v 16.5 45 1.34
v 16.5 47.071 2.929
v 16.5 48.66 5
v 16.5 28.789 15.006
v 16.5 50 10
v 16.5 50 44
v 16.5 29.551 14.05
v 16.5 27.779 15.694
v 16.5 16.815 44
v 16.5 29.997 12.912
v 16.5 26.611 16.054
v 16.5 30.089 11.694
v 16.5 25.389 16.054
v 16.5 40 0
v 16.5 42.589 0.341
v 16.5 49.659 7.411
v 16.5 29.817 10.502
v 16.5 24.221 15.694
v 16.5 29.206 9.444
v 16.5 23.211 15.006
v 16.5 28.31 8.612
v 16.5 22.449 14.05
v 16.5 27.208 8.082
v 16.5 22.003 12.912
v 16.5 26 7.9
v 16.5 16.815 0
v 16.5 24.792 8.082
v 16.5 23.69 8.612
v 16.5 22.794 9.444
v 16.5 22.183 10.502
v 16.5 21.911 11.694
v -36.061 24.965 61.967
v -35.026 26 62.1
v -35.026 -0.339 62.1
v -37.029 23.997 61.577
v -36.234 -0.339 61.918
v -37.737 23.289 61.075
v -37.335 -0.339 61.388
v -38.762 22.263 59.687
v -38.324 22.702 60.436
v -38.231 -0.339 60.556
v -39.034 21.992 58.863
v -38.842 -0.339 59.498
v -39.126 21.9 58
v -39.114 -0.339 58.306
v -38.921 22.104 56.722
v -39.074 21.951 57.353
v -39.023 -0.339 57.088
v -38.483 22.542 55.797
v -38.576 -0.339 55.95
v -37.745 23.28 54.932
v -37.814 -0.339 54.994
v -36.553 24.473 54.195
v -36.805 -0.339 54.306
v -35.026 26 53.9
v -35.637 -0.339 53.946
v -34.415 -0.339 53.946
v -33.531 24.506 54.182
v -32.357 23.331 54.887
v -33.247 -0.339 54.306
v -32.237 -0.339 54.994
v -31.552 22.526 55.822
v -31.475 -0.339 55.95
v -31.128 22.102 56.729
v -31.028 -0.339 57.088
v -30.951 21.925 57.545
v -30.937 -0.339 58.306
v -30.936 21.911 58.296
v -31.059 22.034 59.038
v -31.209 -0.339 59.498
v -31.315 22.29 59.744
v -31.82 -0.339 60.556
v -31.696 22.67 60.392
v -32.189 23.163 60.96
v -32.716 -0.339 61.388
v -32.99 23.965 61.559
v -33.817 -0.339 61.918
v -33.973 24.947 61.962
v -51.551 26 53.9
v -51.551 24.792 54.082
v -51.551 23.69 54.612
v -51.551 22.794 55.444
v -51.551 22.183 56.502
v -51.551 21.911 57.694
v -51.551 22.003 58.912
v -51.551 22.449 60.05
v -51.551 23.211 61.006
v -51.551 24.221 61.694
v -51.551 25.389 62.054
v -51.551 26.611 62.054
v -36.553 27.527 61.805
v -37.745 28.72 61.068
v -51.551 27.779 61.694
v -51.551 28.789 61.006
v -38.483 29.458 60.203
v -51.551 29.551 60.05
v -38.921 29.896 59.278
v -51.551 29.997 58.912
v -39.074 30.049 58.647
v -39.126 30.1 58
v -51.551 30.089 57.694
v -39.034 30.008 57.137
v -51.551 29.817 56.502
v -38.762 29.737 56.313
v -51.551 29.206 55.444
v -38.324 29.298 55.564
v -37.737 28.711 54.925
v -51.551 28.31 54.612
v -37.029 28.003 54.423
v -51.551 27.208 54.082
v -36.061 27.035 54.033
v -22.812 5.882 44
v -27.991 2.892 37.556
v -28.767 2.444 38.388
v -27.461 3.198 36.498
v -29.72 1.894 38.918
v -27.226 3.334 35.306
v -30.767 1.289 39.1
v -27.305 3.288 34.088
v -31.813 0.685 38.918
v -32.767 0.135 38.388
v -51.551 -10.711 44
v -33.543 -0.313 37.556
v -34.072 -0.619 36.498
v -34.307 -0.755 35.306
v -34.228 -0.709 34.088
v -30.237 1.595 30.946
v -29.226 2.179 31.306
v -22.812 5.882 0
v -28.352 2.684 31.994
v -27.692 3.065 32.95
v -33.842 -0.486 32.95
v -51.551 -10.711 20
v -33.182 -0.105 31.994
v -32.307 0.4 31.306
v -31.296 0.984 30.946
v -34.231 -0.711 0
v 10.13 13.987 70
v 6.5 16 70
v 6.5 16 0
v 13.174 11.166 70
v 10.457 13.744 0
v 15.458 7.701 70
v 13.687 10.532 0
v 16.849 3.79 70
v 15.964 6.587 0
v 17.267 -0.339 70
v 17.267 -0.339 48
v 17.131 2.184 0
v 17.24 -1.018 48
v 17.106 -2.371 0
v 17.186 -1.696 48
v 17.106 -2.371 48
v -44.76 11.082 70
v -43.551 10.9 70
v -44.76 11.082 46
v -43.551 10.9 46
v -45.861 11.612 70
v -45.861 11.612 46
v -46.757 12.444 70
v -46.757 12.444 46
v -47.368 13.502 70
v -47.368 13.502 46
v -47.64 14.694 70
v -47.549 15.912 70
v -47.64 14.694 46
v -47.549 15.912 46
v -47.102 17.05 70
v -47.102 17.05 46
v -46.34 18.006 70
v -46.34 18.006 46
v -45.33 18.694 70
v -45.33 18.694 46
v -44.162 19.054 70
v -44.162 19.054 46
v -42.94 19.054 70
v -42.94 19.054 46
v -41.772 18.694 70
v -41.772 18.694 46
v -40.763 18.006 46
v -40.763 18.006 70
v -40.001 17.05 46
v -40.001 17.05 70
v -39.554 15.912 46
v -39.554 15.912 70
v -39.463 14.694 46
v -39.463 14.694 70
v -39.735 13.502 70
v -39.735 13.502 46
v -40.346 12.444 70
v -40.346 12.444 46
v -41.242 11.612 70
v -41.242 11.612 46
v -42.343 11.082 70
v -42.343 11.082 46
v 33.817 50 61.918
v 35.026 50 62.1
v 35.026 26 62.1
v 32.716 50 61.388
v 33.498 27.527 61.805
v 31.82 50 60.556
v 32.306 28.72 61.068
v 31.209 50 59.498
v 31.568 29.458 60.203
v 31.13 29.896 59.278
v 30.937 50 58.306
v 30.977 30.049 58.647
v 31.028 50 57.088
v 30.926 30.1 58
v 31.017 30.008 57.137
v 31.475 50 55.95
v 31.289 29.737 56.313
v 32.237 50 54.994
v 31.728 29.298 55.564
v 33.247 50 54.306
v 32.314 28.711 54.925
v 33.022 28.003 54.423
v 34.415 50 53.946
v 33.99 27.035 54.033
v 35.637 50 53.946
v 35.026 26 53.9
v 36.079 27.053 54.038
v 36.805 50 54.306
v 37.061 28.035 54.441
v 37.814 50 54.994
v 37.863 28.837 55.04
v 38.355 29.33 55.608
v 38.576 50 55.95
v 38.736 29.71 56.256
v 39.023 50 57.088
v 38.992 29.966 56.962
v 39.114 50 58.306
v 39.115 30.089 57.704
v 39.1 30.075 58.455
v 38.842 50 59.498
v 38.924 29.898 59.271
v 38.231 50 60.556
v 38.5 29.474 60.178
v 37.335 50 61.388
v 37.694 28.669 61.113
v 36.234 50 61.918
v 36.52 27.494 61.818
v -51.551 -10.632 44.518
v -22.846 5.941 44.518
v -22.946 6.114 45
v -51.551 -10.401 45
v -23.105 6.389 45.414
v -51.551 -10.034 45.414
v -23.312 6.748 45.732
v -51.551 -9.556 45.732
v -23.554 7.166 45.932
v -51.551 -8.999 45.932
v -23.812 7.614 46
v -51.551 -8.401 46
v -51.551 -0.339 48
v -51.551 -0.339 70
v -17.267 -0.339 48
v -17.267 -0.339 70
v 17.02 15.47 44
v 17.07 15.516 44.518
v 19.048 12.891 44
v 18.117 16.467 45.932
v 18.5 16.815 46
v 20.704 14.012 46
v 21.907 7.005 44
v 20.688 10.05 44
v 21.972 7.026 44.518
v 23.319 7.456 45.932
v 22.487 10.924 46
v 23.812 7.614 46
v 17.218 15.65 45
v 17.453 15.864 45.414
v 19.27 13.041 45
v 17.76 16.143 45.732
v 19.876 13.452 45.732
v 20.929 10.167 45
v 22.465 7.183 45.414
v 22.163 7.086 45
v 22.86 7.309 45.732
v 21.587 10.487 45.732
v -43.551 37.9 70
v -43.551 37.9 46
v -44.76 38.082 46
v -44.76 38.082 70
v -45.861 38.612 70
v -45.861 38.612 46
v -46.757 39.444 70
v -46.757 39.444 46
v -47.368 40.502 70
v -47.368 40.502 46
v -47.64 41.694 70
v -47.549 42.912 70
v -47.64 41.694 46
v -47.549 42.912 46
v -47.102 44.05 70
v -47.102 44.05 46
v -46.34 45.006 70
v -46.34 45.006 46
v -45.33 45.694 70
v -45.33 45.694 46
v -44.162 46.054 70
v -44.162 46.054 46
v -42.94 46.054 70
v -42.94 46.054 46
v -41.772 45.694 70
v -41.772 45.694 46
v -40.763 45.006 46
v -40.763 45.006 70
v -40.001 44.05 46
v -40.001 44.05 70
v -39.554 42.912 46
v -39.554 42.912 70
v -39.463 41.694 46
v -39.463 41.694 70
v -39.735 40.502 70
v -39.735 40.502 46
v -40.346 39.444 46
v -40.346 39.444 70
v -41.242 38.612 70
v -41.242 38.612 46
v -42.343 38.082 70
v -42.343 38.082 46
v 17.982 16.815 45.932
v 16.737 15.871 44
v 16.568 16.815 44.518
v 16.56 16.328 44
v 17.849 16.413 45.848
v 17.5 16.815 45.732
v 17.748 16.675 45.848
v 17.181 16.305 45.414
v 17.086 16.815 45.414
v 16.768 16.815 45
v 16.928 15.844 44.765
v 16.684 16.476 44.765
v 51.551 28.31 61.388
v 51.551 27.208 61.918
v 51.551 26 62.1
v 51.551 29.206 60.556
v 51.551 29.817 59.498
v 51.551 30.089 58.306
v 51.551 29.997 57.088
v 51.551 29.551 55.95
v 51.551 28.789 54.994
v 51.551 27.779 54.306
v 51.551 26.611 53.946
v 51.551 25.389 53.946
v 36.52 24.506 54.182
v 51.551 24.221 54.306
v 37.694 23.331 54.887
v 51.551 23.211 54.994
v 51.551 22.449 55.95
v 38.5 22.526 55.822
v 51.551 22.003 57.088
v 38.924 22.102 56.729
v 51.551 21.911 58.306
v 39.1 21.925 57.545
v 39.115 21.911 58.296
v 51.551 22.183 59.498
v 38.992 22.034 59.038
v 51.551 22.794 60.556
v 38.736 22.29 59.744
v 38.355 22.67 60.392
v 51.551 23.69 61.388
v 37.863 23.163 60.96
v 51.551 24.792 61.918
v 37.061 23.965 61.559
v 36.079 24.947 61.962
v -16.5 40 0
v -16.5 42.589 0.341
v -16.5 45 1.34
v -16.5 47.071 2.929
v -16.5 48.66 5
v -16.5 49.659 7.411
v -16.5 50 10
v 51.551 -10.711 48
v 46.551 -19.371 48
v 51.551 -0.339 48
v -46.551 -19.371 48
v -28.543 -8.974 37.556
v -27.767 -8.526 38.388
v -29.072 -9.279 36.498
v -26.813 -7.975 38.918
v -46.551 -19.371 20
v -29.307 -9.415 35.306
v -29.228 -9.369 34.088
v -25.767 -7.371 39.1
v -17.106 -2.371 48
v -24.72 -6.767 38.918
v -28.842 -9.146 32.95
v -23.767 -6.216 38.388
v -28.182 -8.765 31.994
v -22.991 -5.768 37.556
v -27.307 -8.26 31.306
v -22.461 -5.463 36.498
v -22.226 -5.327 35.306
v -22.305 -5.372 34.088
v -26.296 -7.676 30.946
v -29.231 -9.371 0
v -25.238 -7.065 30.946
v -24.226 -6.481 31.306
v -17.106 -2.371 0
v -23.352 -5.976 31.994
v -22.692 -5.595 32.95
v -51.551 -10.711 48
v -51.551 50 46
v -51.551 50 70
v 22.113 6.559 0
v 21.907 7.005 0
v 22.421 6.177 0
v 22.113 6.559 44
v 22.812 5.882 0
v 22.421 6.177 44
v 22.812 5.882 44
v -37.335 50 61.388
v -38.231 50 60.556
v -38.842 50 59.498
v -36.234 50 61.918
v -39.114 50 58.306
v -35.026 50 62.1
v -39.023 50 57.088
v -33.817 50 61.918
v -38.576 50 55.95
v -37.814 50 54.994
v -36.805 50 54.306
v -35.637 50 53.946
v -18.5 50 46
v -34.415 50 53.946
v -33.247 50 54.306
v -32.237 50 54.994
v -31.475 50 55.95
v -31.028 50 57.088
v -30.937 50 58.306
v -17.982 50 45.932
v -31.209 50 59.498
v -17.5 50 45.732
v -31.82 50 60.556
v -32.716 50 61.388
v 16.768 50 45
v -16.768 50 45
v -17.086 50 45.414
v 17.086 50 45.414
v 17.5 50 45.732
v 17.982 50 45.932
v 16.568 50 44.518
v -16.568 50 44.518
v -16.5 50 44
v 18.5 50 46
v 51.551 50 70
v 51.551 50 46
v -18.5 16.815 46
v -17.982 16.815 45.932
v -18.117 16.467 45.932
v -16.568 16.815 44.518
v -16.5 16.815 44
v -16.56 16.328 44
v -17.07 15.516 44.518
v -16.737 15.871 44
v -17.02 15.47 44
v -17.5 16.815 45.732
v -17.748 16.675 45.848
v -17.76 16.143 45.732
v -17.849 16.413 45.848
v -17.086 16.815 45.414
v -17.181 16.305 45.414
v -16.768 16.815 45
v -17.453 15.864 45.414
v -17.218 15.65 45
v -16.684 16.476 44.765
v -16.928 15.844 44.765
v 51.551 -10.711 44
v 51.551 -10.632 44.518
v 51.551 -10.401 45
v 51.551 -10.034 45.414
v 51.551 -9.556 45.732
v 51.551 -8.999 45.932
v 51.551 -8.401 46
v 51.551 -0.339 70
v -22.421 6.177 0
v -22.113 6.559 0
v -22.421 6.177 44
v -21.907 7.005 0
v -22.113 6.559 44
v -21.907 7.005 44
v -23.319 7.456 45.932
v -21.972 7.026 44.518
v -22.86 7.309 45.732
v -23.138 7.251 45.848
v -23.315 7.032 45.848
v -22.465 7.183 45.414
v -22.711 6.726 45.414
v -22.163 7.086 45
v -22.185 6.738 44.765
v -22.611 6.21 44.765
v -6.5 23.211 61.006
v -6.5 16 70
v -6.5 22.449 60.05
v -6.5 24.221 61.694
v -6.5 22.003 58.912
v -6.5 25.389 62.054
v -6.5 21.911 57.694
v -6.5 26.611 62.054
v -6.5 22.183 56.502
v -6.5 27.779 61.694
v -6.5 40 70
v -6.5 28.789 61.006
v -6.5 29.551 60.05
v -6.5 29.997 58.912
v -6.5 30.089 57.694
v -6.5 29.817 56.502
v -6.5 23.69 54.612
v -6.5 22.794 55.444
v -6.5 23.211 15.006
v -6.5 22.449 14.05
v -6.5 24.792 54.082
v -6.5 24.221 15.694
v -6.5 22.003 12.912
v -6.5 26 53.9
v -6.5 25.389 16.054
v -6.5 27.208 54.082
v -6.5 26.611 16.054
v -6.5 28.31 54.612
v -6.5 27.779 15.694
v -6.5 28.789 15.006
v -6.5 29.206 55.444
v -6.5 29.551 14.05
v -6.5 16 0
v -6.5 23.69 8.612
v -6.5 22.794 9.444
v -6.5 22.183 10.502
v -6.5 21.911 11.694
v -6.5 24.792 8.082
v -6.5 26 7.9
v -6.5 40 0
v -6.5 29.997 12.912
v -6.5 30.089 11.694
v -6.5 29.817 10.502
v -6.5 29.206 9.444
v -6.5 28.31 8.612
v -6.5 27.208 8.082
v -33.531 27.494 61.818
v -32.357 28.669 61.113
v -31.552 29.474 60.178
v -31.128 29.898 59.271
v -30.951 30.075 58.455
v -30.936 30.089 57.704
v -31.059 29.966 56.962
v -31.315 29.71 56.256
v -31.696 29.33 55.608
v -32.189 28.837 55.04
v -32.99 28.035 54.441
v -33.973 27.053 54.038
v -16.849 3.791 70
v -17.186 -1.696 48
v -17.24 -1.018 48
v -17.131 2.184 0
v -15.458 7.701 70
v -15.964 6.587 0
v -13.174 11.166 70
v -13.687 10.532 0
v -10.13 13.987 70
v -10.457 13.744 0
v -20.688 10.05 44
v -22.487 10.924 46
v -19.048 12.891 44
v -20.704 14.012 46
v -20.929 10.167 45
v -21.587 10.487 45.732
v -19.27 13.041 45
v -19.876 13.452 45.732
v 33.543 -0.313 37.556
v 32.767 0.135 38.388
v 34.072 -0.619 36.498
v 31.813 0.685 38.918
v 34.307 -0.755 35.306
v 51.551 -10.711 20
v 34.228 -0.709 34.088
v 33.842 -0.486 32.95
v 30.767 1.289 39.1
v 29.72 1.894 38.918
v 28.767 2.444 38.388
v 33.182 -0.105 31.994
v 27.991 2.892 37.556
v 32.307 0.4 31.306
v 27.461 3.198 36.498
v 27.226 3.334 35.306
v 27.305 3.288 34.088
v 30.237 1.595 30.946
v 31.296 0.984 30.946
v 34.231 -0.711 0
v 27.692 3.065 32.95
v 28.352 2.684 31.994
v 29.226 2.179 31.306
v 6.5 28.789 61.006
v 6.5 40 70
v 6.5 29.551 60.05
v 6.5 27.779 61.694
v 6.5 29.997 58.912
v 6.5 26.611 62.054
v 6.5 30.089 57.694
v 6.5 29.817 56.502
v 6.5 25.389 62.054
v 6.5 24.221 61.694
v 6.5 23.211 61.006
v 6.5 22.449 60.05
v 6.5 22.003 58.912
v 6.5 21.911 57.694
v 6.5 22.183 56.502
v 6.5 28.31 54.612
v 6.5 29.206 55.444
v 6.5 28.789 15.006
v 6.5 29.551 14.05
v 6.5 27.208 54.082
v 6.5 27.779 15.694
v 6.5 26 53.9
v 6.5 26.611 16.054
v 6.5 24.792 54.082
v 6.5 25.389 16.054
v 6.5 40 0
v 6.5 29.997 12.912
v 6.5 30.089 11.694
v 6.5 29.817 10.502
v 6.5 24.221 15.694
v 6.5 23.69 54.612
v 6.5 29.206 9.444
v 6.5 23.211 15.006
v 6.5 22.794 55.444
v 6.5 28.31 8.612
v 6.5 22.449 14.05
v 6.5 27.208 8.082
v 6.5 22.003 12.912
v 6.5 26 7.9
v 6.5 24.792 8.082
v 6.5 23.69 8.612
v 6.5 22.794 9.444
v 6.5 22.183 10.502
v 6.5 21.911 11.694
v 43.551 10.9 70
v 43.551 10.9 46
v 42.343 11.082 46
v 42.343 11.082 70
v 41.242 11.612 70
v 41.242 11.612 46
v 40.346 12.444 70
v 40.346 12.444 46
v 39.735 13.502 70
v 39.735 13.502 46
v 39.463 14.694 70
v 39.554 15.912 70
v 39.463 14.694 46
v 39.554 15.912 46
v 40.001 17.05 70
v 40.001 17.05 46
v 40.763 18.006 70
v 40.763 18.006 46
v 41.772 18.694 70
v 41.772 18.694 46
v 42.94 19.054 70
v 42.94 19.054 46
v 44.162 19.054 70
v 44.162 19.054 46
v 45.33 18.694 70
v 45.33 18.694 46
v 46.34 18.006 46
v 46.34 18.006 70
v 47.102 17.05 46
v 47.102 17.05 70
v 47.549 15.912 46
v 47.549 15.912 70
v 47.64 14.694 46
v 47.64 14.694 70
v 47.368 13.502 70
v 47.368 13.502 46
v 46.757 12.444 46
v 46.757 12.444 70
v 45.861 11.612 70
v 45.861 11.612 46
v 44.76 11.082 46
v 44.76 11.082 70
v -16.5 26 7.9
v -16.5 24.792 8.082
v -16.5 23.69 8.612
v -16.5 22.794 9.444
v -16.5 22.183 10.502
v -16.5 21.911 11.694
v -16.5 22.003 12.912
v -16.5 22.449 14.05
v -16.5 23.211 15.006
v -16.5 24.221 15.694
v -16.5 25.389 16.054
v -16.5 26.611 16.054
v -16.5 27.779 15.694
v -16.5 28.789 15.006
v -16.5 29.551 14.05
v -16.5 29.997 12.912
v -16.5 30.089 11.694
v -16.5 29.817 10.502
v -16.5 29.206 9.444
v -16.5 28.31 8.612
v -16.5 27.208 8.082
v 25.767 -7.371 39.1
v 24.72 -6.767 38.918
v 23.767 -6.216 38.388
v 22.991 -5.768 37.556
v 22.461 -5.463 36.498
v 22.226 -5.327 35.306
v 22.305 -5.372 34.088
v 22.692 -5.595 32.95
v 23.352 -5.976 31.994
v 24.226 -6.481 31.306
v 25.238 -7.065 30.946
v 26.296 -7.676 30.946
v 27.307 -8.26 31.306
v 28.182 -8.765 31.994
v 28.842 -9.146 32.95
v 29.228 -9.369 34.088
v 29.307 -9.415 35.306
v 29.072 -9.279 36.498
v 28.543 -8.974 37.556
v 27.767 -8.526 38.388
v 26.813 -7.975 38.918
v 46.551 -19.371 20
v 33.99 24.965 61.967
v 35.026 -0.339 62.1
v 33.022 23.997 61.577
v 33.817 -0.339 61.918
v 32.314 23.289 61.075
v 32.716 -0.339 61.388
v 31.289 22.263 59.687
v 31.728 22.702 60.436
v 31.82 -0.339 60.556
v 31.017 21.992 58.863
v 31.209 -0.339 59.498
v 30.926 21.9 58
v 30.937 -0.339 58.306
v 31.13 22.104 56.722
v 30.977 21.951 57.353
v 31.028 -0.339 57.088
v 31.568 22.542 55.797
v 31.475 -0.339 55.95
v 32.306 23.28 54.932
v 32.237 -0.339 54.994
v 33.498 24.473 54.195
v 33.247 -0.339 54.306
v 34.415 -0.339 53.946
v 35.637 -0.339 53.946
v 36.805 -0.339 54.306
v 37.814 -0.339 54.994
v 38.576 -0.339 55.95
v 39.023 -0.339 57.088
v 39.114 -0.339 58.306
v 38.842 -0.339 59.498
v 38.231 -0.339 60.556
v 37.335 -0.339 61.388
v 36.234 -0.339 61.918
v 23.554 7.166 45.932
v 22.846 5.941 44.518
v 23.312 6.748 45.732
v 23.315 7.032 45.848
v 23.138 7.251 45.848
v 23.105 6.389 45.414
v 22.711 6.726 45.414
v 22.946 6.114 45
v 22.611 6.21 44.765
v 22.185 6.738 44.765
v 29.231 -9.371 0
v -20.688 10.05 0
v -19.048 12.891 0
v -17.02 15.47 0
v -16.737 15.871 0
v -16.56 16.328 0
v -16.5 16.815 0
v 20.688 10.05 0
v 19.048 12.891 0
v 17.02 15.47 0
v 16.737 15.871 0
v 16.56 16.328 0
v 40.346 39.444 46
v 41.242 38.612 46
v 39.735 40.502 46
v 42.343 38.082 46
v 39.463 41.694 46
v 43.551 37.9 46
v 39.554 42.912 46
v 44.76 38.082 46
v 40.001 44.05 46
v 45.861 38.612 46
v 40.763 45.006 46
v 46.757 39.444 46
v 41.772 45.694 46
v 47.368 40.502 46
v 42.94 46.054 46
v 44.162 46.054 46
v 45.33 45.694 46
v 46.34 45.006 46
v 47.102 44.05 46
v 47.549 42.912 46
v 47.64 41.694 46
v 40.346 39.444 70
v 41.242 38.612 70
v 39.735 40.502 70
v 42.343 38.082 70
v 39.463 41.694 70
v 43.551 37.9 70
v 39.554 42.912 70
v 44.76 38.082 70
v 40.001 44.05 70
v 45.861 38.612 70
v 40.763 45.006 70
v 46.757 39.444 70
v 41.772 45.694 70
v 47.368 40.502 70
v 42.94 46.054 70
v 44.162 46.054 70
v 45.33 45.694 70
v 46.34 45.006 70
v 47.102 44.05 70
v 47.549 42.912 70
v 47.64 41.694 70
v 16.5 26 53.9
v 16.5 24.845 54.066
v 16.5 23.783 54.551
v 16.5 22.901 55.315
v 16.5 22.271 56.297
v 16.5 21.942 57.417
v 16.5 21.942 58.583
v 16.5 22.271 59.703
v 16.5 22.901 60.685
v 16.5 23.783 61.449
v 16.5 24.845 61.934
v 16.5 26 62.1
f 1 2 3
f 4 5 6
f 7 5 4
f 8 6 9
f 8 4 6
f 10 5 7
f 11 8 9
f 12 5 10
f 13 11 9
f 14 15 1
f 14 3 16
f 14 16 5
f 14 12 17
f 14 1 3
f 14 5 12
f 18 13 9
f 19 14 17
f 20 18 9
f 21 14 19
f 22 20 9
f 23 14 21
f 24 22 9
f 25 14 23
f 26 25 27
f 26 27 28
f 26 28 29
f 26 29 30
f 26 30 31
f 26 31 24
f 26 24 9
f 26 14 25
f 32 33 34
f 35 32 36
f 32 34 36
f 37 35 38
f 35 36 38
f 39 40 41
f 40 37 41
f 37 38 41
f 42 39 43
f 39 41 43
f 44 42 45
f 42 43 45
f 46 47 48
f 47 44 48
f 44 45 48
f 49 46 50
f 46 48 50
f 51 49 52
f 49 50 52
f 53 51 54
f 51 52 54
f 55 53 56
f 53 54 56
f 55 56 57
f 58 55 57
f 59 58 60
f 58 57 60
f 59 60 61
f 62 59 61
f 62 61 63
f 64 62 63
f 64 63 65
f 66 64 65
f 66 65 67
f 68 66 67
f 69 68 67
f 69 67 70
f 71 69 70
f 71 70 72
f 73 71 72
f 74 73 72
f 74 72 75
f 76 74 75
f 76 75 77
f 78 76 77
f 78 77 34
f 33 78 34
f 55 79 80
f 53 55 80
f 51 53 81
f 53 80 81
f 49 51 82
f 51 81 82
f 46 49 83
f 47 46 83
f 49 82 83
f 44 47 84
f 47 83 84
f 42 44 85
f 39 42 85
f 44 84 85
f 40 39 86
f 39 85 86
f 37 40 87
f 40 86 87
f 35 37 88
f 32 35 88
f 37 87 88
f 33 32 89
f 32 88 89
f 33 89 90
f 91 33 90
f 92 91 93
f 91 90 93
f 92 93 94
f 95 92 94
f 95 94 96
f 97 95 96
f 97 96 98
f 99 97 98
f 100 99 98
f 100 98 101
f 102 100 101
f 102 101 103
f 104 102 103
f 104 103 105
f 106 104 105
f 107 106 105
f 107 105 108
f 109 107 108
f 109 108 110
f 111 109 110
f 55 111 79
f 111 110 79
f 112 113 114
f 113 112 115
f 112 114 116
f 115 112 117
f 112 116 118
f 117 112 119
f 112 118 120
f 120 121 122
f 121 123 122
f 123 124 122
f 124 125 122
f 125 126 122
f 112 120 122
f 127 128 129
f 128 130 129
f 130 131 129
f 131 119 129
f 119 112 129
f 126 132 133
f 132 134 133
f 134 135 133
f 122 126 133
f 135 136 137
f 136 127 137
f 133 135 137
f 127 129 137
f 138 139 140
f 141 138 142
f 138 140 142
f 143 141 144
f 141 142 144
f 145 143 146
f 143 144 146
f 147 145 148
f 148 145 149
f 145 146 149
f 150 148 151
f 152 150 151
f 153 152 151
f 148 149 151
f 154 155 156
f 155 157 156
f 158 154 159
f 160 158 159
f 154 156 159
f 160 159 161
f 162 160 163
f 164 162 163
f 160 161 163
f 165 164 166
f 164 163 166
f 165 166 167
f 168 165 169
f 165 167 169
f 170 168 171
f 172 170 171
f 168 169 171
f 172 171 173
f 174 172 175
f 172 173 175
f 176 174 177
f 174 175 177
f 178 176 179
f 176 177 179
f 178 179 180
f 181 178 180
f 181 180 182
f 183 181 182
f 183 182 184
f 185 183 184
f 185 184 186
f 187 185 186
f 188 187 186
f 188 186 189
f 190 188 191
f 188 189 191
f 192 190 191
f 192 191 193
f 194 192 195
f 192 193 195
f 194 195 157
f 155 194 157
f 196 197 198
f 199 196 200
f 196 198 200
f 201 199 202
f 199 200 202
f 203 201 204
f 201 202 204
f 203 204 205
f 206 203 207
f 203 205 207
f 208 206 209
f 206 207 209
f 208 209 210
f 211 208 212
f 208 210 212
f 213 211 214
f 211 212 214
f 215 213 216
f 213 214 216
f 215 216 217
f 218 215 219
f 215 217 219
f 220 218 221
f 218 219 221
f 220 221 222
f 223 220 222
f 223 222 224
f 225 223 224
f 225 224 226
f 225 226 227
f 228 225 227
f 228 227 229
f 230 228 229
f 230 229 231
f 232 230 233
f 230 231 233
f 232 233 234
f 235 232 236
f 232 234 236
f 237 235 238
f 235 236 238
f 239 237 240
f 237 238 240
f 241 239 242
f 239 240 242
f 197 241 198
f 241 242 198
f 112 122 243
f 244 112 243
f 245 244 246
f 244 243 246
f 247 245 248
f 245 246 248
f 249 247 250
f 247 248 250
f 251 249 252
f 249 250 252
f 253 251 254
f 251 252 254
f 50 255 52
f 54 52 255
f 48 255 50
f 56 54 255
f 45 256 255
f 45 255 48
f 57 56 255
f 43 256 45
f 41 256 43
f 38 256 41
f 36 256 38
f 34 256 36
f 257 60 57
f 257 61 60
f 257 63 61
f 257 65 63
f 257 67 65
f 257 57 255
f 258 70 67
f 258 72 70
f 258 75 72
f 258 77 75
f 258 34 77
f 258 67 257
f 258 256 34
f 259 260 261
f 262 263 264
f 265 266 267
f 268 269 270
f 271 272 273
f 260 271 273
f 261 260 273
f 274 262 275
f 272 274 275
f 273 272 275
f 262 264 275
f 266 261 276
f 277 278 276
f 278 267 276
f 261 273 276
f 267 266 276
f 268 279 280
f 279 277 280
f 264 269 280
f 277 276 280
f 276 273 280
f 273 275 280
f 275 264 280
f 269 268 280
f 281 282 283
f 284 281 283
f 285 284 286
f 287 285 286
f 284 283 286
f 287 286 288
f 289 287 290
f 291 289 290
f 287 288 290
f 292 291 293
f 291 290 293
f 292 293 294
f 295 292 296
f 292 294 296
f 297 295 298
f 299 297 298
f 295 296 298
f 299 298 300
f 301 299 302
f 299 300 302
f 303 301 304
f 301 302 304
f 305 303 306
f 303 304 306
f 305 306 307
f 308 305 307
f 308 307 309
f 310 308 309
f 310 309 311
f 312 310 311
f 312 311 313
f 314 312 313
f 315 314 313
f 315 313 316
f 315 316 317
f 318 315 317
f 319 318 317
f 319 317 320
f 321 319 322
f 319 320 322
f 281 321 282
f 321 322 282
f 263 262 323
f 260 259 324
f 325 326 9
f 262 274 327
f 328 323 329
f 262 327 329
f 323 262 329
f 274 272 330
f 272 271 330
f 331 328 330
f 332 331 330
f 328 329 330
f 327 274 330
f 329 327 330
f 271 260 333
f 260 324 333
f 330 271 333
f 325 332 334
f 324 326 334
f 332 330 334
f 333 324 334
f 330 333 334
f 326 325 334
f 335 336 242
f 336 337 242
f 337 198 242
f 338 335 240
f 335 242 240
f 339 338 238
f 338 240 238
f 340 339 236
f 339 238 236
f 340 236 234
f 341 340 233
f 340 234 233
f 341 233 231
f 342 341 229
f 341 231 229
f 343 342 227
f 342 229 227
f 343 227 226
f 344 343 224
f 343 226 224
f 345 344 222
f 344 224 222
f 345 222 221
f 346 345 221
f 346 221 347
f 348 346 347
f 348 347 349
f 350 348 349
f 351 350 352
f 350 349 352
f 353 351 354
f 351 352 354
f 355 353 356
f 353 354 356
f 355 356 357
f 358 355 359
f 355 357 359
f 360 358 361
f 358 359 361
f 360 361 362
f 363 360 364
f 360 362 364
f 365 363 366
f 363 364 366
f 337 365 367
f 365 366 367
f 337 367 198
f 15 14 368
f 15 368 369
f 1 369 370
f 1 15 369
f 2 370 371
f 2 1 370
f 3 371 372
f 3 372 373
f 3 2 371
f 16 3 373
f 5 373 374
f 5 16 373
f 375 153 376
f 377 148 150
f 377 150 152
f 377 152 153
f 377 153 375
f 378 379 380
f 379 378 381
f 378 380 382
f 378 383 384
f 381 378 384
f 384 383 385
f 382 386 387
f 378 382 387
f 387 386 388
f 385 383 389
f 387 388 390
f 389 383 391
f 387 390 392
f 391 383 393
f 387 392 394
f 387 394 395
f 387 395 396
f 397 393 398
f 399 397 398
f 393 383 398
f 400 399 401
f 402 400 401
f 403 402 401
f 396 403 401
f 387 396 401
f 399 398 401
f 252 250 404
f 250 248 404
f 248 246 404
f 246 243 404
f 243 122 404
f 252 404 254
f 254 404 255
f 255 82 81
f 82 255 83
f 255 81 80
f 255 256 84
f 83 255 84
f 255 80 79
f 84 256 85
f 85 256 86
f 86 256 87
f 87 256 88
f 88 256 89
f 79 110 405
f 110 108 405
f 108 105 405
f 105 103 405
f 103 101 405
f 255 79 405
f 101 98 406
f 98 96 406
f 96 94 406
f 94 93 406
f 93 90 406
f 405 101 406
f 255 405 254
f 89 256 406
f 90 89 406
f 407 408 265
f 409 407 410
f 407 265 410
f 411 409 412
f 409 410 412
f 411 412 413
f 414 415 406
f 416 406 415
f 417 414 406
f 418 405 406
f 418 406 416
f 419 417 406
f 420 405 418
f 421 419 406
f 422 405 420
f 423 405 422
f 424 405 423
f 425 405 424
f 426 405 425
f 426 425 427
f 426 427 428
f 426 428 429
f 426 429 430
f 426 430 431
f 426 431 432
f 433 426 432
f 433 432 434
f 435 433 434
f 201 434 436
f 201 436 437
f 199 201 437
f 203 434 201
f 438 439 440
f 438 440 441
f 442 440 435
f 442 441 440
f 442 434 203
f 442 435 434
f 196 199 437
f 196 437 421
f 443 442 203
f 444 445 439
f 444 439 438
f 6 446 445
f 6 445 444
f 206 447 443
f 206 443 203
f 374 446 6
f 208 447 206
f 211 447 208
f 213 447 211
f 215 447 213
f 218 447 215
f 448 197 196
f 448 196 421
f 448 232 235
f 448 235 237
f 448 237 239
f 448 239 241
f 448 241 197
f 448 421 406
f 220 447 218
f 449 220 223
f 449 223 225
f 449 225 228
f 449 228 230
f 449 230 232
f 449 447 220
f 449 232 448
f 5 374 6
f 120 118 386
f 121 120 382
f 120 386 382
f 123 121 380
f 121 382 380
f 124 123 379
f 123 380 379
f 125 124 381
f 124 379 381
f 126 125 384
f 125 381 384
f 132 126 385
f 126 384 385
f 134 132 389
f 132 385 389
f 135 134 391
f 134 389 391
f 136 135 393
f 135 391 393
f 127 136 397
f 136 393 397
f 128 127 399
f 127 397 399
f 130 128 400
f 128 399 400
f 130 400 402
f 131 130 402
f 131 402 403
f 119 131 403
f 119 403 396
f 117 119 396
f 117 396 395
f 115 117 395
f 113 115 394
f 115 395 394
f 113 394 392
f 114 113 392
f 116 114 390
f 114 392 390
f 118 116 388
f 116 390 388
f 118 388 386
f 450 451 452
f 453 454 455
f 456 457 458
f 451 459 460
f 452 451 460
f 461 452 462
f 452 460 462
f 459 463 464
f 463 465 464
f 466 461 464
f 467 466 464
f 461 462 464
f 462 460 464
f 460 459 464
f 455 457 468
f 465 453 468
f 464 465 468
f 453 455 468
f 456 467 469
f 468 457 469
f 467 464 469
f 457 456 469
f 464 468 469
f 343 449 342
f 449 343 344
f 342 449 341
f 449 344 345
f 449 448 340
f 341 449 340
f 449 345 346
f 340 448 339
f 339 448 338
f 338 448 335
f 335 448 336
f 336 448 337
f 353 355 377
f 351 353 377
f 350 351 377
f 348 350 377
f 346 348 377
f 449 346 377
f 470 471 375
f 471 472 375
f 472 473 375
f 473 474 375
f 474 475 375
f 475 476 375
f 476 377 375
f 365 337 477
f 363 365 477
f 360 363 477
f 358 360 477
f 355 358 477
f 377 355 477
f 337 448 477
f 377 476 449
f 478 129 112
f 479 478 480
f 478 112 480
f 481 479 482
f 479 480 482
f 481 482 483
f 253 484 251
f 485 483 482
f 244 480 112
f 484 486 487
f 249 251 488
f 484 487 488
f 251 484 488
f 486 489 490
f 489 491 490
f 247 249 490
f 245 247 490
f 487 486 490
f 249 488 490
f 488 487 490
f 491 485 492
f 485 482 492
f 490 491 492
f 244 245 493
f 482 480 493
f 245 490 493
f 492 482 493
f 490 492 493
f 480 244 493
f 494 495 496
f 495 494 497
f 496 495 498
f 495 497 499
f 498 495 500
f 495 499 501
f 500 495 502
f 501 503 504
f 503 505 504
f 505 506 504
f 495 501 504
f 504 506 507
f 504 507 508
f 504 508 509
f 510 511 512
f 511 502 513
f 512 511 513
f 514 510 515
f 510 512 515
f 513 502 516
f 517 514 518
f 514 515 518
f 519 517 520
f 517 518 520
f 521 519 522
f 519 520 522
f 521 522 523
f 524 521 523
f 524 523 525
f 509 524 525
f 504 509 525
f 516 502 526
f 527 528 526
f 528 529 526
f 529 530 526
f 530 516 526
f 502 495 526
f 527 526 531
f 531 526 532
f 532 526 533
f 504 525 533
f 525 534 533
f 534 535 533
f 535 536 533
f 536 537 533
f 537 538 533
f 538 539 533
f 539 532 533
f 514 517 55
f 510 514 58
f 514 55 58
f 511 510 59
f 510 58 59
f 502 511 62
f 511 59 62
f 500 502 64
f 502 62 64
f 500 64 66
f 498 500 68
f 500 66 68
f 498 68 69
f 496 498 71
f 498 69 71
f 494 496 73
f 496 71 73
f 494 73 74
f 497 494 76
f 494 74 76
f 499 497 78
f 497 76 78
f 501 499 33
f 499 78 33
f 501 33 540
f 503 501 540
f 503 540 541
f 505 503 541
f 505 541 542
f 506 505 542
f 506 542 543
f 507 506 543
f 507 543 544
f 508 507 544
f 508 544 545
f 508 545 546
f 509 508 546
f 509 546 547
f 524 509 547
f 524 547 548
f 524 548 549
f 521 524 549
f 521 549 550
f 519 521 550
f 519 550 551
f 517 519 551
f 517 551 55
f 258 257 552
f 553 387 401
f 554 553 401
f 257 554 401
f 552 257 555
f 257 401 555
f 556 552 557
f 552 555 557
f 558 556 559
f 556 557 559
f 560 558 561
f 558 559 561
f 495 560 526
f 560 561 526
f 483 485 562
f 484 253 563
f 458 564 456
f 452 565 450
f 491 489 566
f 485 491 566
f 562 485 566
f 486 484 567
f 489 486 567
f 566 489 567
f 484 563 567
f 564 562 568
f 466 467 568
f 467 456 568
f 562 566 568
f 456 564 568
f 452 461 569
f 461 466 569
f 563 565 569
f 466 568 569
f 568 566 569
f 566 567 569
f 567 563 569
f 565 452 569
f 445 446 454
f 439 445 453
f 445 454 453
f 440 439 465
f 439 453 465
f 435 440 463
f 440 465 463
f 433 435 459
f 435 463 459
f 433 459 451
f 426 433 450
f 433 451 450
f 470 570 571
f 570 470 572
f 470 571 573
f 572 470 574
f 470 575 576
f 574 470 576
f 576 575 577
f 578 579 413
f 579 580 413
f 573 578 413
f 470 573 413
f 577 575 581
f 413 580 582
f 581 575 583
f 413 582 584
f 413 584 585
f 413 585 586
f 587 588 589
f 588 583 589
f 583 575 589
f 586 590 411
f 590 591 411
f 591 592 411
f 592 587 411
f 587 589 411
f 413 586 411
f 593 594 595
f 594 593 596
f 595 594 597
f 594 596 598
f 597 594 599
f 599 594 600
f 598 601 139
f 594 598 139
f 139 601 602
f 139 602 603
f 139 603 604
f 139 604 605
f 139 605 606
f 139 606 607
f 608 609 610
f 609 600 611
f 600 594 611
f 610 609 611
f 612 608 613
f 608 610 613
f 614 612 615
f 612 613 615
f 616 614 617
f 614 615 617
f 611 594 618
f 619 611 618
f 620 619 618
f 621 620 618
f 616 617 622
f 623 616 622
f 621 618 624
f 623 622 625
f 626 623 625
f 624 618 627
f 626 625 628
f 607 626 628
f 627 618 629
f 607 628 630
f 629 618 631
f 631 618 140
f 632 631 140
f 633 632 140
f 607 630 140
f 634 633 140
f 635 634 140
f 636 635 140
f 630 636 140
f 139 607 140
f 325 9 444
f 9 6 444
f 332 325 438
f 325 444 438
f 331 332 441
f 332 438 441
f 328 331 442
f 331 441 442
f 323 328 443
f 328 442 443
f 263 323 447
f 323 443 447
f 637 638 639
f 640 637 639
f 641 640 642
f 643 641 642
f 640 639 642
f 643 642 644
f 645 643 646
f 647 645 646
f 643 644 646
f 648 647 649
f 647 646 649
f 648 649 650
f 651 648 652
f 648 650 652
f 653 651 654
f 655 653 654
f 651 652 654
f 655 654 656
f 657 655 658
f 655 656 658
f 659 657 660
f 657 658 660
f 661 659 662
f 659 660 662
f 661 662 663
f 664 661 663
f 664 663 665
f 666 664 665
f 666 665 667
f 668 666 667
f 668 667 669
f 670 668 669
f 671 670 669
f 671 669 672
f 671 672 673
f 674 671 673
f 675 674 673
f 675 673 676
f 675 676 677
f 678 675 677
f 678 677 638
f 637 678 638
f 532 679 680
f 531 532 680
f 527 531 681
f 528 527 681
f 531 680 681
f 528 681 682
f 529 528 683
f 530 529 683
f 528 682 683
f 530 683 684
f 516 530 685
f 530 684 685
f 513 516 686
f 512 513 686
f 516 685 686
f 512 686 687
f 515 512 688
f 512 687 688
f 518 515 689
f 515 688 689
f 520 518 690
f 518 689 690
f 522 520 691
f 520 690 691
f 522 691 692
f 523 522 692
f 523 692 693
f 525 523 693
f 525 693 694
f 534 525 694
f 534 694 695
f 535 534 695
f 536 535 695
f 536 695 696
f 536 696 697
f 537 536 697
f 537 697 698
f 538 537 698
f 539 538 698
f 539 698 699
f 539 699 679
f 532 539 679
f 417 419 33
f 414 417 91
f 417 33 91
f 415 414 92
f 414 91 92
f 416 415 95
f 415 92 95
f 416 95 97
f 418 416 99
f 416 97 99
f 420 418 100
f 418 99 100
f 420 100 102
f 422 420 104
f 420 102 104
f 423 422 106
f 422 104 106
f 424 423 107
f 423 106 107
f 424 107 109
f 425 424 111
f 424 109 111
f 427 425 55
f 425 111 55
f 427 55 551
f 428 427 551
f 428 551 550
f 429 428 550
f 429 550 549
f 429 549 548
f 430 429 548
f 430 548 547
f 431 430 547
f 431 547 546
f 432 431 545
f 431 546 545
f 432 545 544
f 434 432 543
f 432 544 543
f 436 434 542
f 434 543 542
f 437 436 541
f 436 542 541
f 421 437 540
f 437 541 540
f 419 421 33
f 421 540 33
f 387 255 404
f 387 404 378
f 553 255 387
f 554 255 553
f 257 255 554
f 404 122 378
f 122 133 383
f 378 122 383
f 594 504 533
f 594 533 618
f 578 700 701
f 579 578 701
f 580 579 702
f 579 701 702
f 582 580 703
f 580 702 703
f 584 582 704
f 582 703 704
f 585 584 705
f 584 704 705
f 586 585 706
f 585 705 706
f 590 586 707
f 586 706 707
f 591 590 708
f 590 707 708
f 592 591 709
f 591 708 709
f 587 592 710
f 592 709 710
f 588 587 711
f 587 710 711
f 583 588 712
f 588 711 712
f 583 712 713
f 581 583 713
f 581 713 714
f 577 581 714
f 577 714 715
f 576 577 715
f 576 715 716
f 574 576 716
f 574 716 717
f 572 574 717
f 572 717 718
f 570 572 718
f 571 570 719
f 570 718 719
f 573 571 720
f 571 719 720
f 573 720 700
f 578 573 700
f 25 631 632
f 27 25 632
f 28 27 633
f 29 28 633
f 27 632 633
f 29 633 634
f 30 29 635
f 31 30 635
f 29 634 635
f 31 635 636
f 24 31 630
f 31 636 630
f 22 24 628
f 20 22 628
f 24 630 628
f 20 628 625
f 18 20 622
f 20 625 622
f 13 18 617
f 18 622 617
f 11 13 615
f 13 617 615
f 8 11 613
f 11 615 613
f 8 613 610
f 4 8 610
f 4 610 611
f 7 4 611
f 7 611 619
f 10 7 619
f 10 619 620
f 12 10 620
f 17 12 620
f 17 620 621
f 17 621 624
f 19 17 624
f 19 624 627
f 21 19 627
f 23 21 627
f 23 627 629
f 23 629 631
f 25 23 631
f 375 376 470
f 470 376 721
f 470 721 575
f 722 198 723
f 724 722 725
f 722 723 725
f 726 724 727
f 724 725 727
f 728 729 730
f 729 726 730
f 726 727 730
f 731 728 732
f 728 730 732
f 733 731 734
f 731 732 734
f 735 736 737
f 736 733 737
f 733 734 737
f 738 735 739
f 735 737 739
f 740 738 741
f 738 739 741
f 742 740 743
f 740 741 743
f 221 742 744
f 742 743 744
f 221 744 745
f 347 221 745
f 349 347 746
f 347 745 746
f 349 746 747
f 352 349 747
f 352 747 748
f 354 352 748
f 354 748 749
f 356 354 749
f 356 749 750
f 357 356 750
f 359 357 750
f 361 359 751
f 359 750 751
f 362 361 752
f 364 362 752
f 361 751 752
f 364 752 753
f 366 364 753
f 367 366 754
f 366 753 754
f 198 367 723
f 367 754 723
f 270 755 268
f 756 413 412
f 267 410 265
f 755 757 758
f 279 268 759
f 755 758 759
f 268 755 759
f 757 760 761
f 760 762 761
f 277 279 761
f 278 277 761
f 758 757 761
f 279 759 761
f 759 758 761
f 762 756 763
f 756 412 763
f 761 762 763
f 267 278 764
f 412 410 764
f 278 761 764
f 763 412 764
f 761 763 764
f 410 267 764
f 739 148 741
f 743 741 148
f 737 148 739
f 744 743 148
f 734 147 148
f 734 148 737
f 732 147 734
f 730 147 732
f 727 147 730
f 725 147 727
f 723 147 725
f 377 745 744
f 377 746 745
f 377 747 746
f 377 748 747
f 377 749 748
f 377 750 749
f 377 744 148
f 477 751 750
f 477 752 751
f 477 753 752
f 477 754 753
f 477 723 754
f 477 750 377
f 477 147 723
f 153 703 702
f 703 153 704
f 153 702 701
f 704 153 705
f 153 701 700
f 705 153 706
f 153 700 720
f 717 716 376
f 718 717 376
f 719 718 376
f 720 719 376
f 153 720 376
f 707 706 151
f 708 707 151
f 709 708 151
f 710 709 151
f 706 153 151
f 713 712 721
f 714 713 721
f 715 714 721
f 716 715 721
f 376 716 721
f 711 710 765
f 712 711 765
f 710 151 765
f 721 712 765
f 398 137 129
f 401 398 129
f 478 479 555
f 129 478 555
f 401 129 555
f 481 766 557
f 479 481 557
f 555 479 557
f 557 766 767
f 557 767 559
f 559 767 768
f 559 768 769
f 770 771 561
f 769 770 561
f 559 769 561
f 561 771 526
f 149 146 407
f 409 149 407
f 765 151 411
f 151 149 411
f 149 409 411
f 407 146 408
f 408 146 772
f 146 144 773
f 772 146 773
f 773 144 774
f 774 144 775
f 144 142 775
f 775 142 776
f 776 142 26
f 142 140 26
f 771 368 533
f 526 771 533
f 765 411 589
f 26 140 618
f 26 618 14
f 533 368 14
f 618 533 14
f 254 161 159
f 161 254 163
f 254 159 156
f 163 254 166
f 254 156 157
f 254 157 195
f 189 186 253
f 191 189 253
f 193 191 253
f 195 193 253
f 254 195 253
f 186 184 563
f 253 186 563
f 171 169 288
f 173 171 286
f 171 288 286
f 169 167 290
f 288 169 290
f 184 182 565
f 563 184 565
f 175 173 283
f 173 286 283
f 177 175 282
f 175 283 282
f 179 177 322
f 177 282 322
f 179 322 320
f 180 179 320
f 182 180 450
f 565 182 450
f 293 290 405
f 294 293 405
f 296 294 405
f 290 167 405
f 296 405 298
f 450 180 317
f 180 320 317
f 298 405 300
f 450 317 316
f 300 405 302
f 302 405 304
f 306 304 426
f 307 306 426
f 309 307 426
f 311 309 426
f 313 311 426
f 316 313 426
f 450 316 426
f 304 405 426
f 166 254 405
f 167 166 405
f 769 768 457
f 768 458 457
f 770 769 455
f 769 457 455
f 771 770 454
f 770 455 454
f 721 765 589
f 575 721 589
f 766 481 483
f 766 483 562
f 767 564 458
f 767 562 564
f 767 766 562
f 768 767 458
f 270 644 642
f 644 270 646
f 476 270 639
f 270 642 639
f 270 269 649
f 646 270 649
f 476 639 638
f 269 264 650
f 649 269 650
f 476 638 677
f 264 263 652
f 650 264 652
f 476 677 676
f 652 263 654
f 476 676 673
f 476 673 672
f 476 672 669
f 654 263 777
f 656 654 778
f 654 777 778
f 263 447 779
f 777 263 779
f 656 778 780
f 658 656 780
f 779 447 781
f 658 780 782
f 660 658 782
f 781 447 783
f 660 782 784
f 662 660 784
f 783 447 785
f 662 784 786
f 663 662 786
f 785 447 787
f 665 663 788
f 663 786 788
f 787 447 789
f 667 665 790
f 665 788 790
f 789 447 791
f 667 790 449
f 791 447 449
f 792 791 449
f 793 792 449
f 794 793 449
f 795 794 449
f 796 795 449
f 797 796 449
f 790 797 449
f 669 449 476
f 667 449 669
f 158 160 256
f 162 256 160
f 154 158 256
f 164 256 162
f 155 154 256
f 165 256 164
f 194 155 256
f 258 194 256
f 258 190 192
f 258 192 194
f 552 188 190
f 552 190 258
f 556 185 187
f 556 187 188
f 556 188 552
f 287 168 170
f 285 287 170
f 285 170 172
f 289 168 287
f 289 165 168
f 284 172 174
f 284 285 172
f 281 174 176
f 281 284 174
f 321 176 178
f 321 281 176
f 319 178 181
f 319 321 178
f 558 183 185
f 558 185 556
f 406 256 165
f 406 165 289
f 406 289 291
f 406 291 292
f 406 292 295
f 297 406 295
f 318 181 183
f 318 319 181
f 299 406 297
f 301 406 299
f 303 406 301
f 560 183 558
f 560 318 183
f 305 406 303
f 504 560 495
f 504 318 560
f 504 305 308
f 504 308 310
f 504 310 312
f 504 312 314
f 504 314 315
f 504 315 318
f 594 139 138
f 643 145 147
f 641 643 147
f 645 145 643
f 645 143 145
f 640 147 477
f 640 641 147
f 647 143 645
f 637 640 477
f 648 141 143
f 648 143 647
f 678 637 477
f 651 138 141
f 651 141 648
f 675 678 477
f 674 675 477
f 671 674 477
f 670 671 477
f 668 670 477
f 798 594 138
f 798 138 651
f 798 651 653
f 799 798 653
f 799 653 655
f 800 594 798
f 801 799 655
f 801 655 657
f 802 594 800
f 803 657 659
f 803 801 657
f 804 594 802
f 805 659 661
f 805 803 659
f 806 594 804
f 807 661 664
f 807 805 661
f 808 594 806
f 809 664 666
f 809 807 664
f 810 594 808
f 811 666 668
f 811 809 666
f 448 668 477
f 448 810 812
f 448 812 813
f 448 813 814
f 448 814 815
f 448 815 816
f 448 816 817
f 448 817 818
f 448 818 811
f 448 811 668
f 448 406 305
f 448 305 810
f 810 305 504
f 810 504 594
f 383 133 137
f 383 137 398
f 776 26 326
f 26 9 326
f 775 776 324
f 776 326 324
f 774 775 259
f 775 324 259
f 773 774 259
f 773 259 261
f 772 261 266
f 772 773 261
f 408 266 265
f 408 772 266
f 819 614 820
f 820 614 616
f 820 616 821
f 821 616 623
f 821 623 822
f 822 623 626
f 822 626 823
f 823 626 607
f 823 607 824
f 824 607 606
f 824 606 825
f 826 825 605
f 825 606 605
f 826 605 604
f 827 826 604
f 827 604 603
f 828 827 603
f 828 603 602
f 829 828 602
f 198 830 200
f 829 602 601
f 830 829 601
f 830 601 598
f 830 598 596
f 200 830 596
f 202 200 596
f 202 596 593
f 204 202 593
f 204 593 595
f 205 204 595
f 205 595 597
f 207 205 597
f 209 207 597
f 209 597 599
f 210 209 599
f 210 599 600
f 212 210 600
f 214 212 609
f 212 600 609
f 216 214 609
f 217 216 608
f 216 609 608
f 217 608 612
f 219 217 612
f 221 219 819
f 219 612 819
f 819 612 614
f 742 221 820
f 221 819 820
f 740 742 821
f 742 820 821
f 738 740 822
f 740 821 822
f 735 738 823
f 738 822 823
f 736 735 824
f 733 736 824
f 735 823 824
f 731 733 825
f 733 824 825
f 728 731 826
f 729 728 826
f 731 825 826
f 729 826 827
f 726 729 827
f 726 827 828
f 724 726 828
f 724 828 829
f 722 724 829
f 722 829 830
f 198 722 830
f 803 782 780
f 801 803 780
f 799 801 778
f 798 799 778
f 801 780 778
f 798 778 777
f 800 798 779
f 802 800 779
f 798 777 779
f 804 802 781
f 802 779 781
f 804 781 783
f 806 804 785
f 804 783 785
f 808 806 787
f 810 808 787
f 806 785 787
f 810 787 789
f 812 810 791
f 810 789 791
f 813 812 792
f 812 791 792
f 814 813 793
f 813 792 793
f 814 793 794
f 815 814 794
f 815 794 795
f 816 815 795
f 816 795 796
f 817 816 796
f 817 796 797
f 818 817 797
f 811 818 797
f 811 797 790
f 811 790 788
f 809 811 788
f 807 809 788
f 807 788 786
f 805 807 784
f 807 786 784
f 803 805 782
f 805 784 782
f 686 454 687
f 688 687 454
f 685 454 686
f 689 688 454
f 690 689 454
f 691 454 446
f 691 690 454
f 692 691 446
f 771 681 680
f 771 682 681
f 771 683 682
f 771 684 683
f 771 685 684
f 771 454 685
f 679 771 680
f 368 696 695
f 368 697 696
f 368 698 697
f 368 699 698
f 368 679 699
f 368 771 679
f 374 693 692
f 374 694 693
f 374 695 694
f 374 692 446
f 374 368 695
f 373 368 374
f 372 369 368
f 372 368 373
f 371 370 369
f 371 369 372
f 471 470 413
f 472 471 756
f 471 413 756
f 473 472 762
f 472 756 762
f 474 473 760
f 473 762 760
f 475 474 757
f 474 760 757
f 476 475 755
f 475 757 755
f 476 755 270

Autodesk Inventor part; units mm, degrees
ref_plane "YZ Plane" through (0, 0, 0) normal (1, 0, 0) x (0, 1, 0)
ref_plane "XZ Plane" through (0, 0, 0) normal (0, 1, 0) x (-1, 0, 0)
ref_plane "XY Plane" through (0, 0, 0) normal (0, 0, 1) x (1, 0, 0)
sketch "Sketch1" plane through (0, 0, 0) normal (0, 0, 1) x (1, 0, 0)
  circle A0 centre (0, 0) radius 15 construction
  circle A1 centre (0, 0) radius 26 construction
  line L0 (3.5, 37) -> (-3.5, 37) construction
  line L1 (-3.5, 37) -> (-3.5, 15) construction
  line L2 (-3.5, 15) -> (3.5, 15) construction
  line L3 (3.5, 15) -> (3.5, 37) construction
  line L4 (3.5, 37) -> (-3.5, 15) construction
  line L5 (-3.5, 37) -> (3.5, 15) construction
  line L6 (-6.5, 16) -> (-6.5, 40) construction
  line L7 (-6.5, 40) -> (6.5, 40) construction
  line L8 (6.5, 40) -> (6.5, 16) construction
  circle A2 centre (0, 0) radius 17.2699 construction
  line L9 (-16.5, 16) -> (-16.5, 50) construction
  line L10 (-16.5, 50) -> (16.5, 50) construction
  line L11 (16.5, 50) -> (16.5, 16) construction
  circle A3 centre (0, 0) radius 23 construction
  line L12 (-25, 26) -> (25, 26) construction
  line L13 (-25, 30) -> (25, 30) construction
  line L14 (-25, 22) -> (25, 22) construction
  line L15 (-35.0513, -39.2894) -> (-51.5513, -10.7106) construction
  line L16 (-31.391, -25.6292) -> (-37.891, -14.3708) construction
  line L17 (-5.6064, -22.2894) -> (-35.0513, -39.2894) construction
  line L18 (-51.5513, -10.7106) -> (-22.1064, 6.2894) construction
  line L19 (-37.891, -14.3708) -> (-17.1064, -2.3708) construction
  line L20 (-10.6064, -13.6292) -> (-31.391, -25.6292) construction
  line L21 (-30.2929, -21.5311) -> (-11.2404, -10.5311) construction
  line L22 (-11.2404, -10.5311) -> (-14.7404, -4.4689) construction
  line L23 (-14.7404, -4.4689) -> (-33.7929, -15.4689) construction
  line L24 (-33.7929, -15.4689) -> (-11.2404, -10.5311) construction
  line L25 (-30.2929, -21.5311) -> (-14.7404, -4.4689) construction
  line L26 (-33.7929, -15.4689) -> (-30.2929, -21.5311) construction
  line L27 (-13.4808, -36.6506) -> (-38.4808, 6.6506) construction
  line L28 (-10.0167, -34.6506) -> (-35.0167, 8.6506) construction
  line L29 (-6.5526, -32.6506) -> (-31.5526, 10.6506) construction
  line L30 (51.5513, -10.7106) -> (35.0513, -39.2894) construction
  line L31 (37.891, -14.3708) -> (31.391, -25.6292) construction
  line L32 (22.1064, 6.2894) -> (51.5513, -10.7106) construction
  line L33 (35.0513, -39.2894) -> (5.6064, -22.2894) construction
  line L34 (31.391, -25.6292) -> (10.6064, -13.6292) construction
  line L35 (17.1064, -2.3708) -> (37.891, -14.3708) construction
  line L36 (33.7929, -15.4689) -> (14.7404, -4.4689) construction
  line L37 (14.7404, -4.4689) -> (11.2404, -10.5311) construction
  line L38 (11.2404, -10.5311) -> (30.2929, -21.5311) construction
  line L39 (30.2929, -21.5311) -> (14.7404, -4.4689) construction
  line L40 (33.7929, -15.4689) -> (11.2404, -10.5311) construction
  line L41 (30.2929, -21.5311) -> (33.7929, -15.4689) construction
  line L42 (38.4808, 6.6506) -> (13.4808, -36.6506) construction
  line L43 (35.0167, 8.6506) -> (10.0167, -34.6506) construction
  line L44 (31.5526, 10.6506) -> (6.5526, -32.6506) construction
  line L45 (-16.5, 16.0234) -> (-16.5, 50)
  line L46 (-16.5, 50) -> (16.5, 50)
  line L47 (16.5, 50) -> (16.5, 16.0234)
  line L48 (-6.5, 16) -> (-6.5, 40)
  line L49 (-6.5, 40) -> (6.5, 40)
  line L50 (6.5, 40) -> (6.5, 16)
  line L51 (-22.1267, 6.2777) -> (-51.5513, -10.7106)
  line L52 (-51.5513, -10.7106) -> (-46.5513, -19.3708)
  line L53 (-46.5513, -19.3708) -> (-17.1064, -2.3708)
  line L54 (46.5513, -19.3708) -> (51.5513, -10.7106)
  line L55 (51.5513, -10.7106) -> (22.1267, 6.2777)
  line L56 (17.1064, -2.3708) -> (46.5513, -19.3708)
  line L57 (37.891, -14.3708) -> (31.391, -25.6292)
  arc A4 (-6.5, 16) -> (-17.1064, -2.3708) centre (0, 0) ccw
  arc A5 (-16.5, 16.0234) -> (-22.1267, 6.2777) centre (0, 0) ccw
  arc A6 (17.1064, -2.3708) -> (6.5, 16) centre (0, 0) ccw
  arc A7 (22.1267, 6.2777) -> (16.5, 16.0234) centre (0, 0) ccw
  point P0 (0, 26)
  point P1 (0, 26)
  point P2 (0, 26)
  point P3 (0, 30)
  point P4 (0, 22)
  point P5 (-25.9808, -15)
  point P6 (-22.5167, -13)
  point P7 (-22.5167, -13)
  point P8 (-22.5167, -13)
  point P9 (-5.6267, -22.3011)
  point P10 (-19.0526, -11)
  point P11 (25.9808, -15)
  point P12 (22.5167, -13)
  point P13 (22.5167, -13)
  point P14 (22.5167, -13)
  point P15 (19.0526, -11)
  dimension "d1" = 52
  dimension "d0" = 30
  dimension "d2" = 7
  dimension "d4" = 3
  dimension "d5" = 3
  dimension "d6" = 3
  dimension "d7" = 16
  dimension "d8" = 10
  dimension "d9" = 10
  dimension "d11" = 10
  dimension "d12" = 3
  dimension "d13" = 50
  dimension "d14" = 4
  dimension "d15" = 4
  dimension "d16" = 50
  dimension "d17" = 50
  dimension "d20" = 360
extrude "Extrusion3" add sketch "Sketch1" along normal blind 70
sketch "Sketch6" plane through (16.5, 16.0234, 0) normal (1, 0, 0) x (0, 0, -1)
  line L0 (0, 9.9766) -> (-71.7893, 9.9766) construction
  line L1 (-70, 0) -> (-70, 33.9766) construction
  point P0 (0, -16.0234)
  point P1 (0, 9.9766)
  point P2 (-58, 9.9766)
  point P3 (-12, 9.9766)
  dimension "d46" = 12
  dimension "d47" = 12
sketch "Sketch7" plane through (0, 0, 70) normal (0, 0, 1) x (1, 0, 0)
  line L0 (-22.1267, 6.2777) -> (-51.5513, -10.7106) projected
  line L1 (-51.5513, -10.7106) -> (-51.5513, 50)
  line L2 (-51.5513, 50) -> (-16.5, 50)
  line L3 (16.5, 16.0234) -> (16.5, 50) projected
  line L4 (16.5, 50) -> (51.5513, 50)
  line L5 (51.5513, 50) -> (51.5513, -10.7106)
  arc A0 (-16.5, 16.0234) -> (-22.1267, 6.2777) centre (0, 0) ccw projected
  line L6 (-16.5, 50) -> (-16.5, 16.0234) projected
  arc A1 (22.1267, 6.2777) -> (16.5, 16.0234) centre (0, 0) ccw projected
  line L7 (51.5513, -10.7106) -> (22.1267, 6.2777) projected
  line L8 (51.5513, 50) -> (51.5513, -10.7106)
  point P0 (0, 0)
  point P1 (16.5, 26)
extrude "Extrusion5" add sketch "Sketch7" against normal blind 24
hole "Hole3" at (16.5, 26, 58) at (16.5, 26, 12) direction (-1, 0, 0) diameter 8.2 end through all
hole "Hole4" at (-51.5513, 26, 58) direction (1, 0, 0) diameter 8.2 end through all
sketch "Sketch10" plane through (-22.1267, 6.2777, 46) normal (-0.5, 0.866, 0) x (0.866, 0.5, 0)
  line L0 (-9.9766, 46) -> (-9.9766, -2.7834) construction
  line L1 (-33.9766, 0) -> (0, 0) construction
  line L2 (-33.9766, 46) -> (-33.9766, -24) construction
  line L3 (-33.9766, 11) -> (0, 11) construction
  line L4 (0, 46) -> (0, 0) construction
  point P0 (16.0234, 46)
  point P1 (-9.9766, 46)
  point P2 (-9.9766, 11)
hole "Hole5" at (-30.7667, 1.2894, 35) direction (0.5, -0.866, 0) diameter 8.2 end through all
sketch "Sketch11" plane through (51.5513, -10.7106, 46) normal (0.5, 0.866, 0) x (0.866, -0.5, 0)
  line L0 (-24, 46) -> (-24, 0) construction
  line L1 (-33.9766, 0) -> (0, 0) construction
  line L2 (0, 46) -> (0, -24) construction
  line L3 (0, 11) -> (-34, 11) construction
  line L4 (-34, 46) -> (-34, -24) construction
  point P0 (-50, 46)
  point P1 (-24, 11)
hole "Hole6" at (30.7667, 1.2894, 35) direction (-0.5, -0.866, 0) diameter 8.2 end through all
fillet "Fillet2" radius 2 10 edges at (-36.839, -2.2164, 46) (-19.9186, 11.5, 46) (-16.5, 33.0117, 46) (-16.5, 16.0234, 23) (-22.1267, 6.2777, 23) (16.5, 16.0234, 23) (22.1267, 6.2777, 23) (16.5, 33.0117, 46) (19.9186, 11.5, 46) (36.839, -2.2164, 46)
fillet "Fillet3" radius 10 1 edges at (0, 50, 0)
chamfer "Chamfer1" distance 20 angle 45 2 edges at (49.0513, -15.0407, 0) (-49.0513, -15.0407, 0)
sketch "Sketch12" plane through (-51.5513, 50, 70) normal (0, 1, 0) x (1, 0, 0)
  line L0 (0, 0) -> (0, 24) construction
  line L1 (0, 12) -> (103.1025, 12) construction
  line L2 (103.1025, 0) -> (103.1025, 24) construction
  line L3 (0, 24) -> (33.0513, 24) construction
  line L4 (16.5256, 24) -> (16.5256, 0) construction
  line L5 (5, 0) -> (34.4449, 0) construction
  line L6 (70.0513, 24) -> (103.1025, 24) construction
  line L7 (86.5769, 24) -> (86.5769, 0) construction
  line L8 (103.1025, 0) -> (0, 0) construction
  point P0 (51.5513, 70)
  point P1 (86.5769, 12)
  point P2 (16.5256, 12)
hole "Hole7" at (35.0256, 50, 58) at (-35.0256, 50, 58) direction (0, -1, 0) diameter 8.2 end through all
sketch "Sketch13" plane through (0, 0, 70) normal (0, 0, 1) x (1, 0, 0)
  line L0 (51.5513, 50) -> (-51.5513, 50) construction
  line L1 (-43.5513, 50) -> (-43.5513, -5) construction
  line L2 (0, 50) -> (0, -7.7688) construction
  point P0 (0, 0)
  point P1 (-43.5513, 42)
  point P2 (-43.5513, 15)
  point P3 (-43.5513, 42)
  point P4 (-43.5513, 15)
  point P5 (43.5513, 42)
  point P6 (43.5513, 15)
  point P7 (43.5513, 42)
  point P8 (43.5513, 15)
  dimension "d95" = 8
  dimension "d96" = 8
  dimension "d97" = 35
hole "Hole8" at (-43.5513, 42, 70) at (-43.5513, 15, 70) at (43.5513, 42, 70) at (43.5513, 15, 70) direction (0, 0, -1) diameter 8.2 end through all
sketch "Sketch14" plane through (0, 0, 70) normal (0, 0, 1) x (1, 0, 0)
  point P0 (0, 0)
sketch "Sketch15" plane through (0, 0, 70) normal (0, 0, 1) x (1, 0, 0)
  line L0 (-51.5513, 50) -> (-51.5513, -10.7106) projected
  line L1 (51.5513, -10.7106) -> (51.5513, 50) projected
  line L2 (-51.5513, -0.3388) -> (51.5513, -0.3388)
  line L3 (51.5513, -0.3388) -> (51.5513, -25.3388)
  line L4 (51.5513, -25.3388) -> (-51.5513, -25.3388)
  line L5 (-51.5513, -25.3388) -> (-51.5513, -0.3388)
  point P0 (0, 0)
  dimension "d105" = 25
extrude "Extrusion6" cut sketch "Sketch15" against normal blind 22
equation "\"d5\" = d4"
equation "\"d6\" = d4"
equation "\"d9\" = d8"
equation "\"d15\" = d14"
equation "\"d16\" = d13"
equation "\"d17\" = d16"
equation "\"d46\" = d47"
equation "\"d50\" = 2 * d47"
properties part number "Linear_pipe" material "ABS Plastic"
